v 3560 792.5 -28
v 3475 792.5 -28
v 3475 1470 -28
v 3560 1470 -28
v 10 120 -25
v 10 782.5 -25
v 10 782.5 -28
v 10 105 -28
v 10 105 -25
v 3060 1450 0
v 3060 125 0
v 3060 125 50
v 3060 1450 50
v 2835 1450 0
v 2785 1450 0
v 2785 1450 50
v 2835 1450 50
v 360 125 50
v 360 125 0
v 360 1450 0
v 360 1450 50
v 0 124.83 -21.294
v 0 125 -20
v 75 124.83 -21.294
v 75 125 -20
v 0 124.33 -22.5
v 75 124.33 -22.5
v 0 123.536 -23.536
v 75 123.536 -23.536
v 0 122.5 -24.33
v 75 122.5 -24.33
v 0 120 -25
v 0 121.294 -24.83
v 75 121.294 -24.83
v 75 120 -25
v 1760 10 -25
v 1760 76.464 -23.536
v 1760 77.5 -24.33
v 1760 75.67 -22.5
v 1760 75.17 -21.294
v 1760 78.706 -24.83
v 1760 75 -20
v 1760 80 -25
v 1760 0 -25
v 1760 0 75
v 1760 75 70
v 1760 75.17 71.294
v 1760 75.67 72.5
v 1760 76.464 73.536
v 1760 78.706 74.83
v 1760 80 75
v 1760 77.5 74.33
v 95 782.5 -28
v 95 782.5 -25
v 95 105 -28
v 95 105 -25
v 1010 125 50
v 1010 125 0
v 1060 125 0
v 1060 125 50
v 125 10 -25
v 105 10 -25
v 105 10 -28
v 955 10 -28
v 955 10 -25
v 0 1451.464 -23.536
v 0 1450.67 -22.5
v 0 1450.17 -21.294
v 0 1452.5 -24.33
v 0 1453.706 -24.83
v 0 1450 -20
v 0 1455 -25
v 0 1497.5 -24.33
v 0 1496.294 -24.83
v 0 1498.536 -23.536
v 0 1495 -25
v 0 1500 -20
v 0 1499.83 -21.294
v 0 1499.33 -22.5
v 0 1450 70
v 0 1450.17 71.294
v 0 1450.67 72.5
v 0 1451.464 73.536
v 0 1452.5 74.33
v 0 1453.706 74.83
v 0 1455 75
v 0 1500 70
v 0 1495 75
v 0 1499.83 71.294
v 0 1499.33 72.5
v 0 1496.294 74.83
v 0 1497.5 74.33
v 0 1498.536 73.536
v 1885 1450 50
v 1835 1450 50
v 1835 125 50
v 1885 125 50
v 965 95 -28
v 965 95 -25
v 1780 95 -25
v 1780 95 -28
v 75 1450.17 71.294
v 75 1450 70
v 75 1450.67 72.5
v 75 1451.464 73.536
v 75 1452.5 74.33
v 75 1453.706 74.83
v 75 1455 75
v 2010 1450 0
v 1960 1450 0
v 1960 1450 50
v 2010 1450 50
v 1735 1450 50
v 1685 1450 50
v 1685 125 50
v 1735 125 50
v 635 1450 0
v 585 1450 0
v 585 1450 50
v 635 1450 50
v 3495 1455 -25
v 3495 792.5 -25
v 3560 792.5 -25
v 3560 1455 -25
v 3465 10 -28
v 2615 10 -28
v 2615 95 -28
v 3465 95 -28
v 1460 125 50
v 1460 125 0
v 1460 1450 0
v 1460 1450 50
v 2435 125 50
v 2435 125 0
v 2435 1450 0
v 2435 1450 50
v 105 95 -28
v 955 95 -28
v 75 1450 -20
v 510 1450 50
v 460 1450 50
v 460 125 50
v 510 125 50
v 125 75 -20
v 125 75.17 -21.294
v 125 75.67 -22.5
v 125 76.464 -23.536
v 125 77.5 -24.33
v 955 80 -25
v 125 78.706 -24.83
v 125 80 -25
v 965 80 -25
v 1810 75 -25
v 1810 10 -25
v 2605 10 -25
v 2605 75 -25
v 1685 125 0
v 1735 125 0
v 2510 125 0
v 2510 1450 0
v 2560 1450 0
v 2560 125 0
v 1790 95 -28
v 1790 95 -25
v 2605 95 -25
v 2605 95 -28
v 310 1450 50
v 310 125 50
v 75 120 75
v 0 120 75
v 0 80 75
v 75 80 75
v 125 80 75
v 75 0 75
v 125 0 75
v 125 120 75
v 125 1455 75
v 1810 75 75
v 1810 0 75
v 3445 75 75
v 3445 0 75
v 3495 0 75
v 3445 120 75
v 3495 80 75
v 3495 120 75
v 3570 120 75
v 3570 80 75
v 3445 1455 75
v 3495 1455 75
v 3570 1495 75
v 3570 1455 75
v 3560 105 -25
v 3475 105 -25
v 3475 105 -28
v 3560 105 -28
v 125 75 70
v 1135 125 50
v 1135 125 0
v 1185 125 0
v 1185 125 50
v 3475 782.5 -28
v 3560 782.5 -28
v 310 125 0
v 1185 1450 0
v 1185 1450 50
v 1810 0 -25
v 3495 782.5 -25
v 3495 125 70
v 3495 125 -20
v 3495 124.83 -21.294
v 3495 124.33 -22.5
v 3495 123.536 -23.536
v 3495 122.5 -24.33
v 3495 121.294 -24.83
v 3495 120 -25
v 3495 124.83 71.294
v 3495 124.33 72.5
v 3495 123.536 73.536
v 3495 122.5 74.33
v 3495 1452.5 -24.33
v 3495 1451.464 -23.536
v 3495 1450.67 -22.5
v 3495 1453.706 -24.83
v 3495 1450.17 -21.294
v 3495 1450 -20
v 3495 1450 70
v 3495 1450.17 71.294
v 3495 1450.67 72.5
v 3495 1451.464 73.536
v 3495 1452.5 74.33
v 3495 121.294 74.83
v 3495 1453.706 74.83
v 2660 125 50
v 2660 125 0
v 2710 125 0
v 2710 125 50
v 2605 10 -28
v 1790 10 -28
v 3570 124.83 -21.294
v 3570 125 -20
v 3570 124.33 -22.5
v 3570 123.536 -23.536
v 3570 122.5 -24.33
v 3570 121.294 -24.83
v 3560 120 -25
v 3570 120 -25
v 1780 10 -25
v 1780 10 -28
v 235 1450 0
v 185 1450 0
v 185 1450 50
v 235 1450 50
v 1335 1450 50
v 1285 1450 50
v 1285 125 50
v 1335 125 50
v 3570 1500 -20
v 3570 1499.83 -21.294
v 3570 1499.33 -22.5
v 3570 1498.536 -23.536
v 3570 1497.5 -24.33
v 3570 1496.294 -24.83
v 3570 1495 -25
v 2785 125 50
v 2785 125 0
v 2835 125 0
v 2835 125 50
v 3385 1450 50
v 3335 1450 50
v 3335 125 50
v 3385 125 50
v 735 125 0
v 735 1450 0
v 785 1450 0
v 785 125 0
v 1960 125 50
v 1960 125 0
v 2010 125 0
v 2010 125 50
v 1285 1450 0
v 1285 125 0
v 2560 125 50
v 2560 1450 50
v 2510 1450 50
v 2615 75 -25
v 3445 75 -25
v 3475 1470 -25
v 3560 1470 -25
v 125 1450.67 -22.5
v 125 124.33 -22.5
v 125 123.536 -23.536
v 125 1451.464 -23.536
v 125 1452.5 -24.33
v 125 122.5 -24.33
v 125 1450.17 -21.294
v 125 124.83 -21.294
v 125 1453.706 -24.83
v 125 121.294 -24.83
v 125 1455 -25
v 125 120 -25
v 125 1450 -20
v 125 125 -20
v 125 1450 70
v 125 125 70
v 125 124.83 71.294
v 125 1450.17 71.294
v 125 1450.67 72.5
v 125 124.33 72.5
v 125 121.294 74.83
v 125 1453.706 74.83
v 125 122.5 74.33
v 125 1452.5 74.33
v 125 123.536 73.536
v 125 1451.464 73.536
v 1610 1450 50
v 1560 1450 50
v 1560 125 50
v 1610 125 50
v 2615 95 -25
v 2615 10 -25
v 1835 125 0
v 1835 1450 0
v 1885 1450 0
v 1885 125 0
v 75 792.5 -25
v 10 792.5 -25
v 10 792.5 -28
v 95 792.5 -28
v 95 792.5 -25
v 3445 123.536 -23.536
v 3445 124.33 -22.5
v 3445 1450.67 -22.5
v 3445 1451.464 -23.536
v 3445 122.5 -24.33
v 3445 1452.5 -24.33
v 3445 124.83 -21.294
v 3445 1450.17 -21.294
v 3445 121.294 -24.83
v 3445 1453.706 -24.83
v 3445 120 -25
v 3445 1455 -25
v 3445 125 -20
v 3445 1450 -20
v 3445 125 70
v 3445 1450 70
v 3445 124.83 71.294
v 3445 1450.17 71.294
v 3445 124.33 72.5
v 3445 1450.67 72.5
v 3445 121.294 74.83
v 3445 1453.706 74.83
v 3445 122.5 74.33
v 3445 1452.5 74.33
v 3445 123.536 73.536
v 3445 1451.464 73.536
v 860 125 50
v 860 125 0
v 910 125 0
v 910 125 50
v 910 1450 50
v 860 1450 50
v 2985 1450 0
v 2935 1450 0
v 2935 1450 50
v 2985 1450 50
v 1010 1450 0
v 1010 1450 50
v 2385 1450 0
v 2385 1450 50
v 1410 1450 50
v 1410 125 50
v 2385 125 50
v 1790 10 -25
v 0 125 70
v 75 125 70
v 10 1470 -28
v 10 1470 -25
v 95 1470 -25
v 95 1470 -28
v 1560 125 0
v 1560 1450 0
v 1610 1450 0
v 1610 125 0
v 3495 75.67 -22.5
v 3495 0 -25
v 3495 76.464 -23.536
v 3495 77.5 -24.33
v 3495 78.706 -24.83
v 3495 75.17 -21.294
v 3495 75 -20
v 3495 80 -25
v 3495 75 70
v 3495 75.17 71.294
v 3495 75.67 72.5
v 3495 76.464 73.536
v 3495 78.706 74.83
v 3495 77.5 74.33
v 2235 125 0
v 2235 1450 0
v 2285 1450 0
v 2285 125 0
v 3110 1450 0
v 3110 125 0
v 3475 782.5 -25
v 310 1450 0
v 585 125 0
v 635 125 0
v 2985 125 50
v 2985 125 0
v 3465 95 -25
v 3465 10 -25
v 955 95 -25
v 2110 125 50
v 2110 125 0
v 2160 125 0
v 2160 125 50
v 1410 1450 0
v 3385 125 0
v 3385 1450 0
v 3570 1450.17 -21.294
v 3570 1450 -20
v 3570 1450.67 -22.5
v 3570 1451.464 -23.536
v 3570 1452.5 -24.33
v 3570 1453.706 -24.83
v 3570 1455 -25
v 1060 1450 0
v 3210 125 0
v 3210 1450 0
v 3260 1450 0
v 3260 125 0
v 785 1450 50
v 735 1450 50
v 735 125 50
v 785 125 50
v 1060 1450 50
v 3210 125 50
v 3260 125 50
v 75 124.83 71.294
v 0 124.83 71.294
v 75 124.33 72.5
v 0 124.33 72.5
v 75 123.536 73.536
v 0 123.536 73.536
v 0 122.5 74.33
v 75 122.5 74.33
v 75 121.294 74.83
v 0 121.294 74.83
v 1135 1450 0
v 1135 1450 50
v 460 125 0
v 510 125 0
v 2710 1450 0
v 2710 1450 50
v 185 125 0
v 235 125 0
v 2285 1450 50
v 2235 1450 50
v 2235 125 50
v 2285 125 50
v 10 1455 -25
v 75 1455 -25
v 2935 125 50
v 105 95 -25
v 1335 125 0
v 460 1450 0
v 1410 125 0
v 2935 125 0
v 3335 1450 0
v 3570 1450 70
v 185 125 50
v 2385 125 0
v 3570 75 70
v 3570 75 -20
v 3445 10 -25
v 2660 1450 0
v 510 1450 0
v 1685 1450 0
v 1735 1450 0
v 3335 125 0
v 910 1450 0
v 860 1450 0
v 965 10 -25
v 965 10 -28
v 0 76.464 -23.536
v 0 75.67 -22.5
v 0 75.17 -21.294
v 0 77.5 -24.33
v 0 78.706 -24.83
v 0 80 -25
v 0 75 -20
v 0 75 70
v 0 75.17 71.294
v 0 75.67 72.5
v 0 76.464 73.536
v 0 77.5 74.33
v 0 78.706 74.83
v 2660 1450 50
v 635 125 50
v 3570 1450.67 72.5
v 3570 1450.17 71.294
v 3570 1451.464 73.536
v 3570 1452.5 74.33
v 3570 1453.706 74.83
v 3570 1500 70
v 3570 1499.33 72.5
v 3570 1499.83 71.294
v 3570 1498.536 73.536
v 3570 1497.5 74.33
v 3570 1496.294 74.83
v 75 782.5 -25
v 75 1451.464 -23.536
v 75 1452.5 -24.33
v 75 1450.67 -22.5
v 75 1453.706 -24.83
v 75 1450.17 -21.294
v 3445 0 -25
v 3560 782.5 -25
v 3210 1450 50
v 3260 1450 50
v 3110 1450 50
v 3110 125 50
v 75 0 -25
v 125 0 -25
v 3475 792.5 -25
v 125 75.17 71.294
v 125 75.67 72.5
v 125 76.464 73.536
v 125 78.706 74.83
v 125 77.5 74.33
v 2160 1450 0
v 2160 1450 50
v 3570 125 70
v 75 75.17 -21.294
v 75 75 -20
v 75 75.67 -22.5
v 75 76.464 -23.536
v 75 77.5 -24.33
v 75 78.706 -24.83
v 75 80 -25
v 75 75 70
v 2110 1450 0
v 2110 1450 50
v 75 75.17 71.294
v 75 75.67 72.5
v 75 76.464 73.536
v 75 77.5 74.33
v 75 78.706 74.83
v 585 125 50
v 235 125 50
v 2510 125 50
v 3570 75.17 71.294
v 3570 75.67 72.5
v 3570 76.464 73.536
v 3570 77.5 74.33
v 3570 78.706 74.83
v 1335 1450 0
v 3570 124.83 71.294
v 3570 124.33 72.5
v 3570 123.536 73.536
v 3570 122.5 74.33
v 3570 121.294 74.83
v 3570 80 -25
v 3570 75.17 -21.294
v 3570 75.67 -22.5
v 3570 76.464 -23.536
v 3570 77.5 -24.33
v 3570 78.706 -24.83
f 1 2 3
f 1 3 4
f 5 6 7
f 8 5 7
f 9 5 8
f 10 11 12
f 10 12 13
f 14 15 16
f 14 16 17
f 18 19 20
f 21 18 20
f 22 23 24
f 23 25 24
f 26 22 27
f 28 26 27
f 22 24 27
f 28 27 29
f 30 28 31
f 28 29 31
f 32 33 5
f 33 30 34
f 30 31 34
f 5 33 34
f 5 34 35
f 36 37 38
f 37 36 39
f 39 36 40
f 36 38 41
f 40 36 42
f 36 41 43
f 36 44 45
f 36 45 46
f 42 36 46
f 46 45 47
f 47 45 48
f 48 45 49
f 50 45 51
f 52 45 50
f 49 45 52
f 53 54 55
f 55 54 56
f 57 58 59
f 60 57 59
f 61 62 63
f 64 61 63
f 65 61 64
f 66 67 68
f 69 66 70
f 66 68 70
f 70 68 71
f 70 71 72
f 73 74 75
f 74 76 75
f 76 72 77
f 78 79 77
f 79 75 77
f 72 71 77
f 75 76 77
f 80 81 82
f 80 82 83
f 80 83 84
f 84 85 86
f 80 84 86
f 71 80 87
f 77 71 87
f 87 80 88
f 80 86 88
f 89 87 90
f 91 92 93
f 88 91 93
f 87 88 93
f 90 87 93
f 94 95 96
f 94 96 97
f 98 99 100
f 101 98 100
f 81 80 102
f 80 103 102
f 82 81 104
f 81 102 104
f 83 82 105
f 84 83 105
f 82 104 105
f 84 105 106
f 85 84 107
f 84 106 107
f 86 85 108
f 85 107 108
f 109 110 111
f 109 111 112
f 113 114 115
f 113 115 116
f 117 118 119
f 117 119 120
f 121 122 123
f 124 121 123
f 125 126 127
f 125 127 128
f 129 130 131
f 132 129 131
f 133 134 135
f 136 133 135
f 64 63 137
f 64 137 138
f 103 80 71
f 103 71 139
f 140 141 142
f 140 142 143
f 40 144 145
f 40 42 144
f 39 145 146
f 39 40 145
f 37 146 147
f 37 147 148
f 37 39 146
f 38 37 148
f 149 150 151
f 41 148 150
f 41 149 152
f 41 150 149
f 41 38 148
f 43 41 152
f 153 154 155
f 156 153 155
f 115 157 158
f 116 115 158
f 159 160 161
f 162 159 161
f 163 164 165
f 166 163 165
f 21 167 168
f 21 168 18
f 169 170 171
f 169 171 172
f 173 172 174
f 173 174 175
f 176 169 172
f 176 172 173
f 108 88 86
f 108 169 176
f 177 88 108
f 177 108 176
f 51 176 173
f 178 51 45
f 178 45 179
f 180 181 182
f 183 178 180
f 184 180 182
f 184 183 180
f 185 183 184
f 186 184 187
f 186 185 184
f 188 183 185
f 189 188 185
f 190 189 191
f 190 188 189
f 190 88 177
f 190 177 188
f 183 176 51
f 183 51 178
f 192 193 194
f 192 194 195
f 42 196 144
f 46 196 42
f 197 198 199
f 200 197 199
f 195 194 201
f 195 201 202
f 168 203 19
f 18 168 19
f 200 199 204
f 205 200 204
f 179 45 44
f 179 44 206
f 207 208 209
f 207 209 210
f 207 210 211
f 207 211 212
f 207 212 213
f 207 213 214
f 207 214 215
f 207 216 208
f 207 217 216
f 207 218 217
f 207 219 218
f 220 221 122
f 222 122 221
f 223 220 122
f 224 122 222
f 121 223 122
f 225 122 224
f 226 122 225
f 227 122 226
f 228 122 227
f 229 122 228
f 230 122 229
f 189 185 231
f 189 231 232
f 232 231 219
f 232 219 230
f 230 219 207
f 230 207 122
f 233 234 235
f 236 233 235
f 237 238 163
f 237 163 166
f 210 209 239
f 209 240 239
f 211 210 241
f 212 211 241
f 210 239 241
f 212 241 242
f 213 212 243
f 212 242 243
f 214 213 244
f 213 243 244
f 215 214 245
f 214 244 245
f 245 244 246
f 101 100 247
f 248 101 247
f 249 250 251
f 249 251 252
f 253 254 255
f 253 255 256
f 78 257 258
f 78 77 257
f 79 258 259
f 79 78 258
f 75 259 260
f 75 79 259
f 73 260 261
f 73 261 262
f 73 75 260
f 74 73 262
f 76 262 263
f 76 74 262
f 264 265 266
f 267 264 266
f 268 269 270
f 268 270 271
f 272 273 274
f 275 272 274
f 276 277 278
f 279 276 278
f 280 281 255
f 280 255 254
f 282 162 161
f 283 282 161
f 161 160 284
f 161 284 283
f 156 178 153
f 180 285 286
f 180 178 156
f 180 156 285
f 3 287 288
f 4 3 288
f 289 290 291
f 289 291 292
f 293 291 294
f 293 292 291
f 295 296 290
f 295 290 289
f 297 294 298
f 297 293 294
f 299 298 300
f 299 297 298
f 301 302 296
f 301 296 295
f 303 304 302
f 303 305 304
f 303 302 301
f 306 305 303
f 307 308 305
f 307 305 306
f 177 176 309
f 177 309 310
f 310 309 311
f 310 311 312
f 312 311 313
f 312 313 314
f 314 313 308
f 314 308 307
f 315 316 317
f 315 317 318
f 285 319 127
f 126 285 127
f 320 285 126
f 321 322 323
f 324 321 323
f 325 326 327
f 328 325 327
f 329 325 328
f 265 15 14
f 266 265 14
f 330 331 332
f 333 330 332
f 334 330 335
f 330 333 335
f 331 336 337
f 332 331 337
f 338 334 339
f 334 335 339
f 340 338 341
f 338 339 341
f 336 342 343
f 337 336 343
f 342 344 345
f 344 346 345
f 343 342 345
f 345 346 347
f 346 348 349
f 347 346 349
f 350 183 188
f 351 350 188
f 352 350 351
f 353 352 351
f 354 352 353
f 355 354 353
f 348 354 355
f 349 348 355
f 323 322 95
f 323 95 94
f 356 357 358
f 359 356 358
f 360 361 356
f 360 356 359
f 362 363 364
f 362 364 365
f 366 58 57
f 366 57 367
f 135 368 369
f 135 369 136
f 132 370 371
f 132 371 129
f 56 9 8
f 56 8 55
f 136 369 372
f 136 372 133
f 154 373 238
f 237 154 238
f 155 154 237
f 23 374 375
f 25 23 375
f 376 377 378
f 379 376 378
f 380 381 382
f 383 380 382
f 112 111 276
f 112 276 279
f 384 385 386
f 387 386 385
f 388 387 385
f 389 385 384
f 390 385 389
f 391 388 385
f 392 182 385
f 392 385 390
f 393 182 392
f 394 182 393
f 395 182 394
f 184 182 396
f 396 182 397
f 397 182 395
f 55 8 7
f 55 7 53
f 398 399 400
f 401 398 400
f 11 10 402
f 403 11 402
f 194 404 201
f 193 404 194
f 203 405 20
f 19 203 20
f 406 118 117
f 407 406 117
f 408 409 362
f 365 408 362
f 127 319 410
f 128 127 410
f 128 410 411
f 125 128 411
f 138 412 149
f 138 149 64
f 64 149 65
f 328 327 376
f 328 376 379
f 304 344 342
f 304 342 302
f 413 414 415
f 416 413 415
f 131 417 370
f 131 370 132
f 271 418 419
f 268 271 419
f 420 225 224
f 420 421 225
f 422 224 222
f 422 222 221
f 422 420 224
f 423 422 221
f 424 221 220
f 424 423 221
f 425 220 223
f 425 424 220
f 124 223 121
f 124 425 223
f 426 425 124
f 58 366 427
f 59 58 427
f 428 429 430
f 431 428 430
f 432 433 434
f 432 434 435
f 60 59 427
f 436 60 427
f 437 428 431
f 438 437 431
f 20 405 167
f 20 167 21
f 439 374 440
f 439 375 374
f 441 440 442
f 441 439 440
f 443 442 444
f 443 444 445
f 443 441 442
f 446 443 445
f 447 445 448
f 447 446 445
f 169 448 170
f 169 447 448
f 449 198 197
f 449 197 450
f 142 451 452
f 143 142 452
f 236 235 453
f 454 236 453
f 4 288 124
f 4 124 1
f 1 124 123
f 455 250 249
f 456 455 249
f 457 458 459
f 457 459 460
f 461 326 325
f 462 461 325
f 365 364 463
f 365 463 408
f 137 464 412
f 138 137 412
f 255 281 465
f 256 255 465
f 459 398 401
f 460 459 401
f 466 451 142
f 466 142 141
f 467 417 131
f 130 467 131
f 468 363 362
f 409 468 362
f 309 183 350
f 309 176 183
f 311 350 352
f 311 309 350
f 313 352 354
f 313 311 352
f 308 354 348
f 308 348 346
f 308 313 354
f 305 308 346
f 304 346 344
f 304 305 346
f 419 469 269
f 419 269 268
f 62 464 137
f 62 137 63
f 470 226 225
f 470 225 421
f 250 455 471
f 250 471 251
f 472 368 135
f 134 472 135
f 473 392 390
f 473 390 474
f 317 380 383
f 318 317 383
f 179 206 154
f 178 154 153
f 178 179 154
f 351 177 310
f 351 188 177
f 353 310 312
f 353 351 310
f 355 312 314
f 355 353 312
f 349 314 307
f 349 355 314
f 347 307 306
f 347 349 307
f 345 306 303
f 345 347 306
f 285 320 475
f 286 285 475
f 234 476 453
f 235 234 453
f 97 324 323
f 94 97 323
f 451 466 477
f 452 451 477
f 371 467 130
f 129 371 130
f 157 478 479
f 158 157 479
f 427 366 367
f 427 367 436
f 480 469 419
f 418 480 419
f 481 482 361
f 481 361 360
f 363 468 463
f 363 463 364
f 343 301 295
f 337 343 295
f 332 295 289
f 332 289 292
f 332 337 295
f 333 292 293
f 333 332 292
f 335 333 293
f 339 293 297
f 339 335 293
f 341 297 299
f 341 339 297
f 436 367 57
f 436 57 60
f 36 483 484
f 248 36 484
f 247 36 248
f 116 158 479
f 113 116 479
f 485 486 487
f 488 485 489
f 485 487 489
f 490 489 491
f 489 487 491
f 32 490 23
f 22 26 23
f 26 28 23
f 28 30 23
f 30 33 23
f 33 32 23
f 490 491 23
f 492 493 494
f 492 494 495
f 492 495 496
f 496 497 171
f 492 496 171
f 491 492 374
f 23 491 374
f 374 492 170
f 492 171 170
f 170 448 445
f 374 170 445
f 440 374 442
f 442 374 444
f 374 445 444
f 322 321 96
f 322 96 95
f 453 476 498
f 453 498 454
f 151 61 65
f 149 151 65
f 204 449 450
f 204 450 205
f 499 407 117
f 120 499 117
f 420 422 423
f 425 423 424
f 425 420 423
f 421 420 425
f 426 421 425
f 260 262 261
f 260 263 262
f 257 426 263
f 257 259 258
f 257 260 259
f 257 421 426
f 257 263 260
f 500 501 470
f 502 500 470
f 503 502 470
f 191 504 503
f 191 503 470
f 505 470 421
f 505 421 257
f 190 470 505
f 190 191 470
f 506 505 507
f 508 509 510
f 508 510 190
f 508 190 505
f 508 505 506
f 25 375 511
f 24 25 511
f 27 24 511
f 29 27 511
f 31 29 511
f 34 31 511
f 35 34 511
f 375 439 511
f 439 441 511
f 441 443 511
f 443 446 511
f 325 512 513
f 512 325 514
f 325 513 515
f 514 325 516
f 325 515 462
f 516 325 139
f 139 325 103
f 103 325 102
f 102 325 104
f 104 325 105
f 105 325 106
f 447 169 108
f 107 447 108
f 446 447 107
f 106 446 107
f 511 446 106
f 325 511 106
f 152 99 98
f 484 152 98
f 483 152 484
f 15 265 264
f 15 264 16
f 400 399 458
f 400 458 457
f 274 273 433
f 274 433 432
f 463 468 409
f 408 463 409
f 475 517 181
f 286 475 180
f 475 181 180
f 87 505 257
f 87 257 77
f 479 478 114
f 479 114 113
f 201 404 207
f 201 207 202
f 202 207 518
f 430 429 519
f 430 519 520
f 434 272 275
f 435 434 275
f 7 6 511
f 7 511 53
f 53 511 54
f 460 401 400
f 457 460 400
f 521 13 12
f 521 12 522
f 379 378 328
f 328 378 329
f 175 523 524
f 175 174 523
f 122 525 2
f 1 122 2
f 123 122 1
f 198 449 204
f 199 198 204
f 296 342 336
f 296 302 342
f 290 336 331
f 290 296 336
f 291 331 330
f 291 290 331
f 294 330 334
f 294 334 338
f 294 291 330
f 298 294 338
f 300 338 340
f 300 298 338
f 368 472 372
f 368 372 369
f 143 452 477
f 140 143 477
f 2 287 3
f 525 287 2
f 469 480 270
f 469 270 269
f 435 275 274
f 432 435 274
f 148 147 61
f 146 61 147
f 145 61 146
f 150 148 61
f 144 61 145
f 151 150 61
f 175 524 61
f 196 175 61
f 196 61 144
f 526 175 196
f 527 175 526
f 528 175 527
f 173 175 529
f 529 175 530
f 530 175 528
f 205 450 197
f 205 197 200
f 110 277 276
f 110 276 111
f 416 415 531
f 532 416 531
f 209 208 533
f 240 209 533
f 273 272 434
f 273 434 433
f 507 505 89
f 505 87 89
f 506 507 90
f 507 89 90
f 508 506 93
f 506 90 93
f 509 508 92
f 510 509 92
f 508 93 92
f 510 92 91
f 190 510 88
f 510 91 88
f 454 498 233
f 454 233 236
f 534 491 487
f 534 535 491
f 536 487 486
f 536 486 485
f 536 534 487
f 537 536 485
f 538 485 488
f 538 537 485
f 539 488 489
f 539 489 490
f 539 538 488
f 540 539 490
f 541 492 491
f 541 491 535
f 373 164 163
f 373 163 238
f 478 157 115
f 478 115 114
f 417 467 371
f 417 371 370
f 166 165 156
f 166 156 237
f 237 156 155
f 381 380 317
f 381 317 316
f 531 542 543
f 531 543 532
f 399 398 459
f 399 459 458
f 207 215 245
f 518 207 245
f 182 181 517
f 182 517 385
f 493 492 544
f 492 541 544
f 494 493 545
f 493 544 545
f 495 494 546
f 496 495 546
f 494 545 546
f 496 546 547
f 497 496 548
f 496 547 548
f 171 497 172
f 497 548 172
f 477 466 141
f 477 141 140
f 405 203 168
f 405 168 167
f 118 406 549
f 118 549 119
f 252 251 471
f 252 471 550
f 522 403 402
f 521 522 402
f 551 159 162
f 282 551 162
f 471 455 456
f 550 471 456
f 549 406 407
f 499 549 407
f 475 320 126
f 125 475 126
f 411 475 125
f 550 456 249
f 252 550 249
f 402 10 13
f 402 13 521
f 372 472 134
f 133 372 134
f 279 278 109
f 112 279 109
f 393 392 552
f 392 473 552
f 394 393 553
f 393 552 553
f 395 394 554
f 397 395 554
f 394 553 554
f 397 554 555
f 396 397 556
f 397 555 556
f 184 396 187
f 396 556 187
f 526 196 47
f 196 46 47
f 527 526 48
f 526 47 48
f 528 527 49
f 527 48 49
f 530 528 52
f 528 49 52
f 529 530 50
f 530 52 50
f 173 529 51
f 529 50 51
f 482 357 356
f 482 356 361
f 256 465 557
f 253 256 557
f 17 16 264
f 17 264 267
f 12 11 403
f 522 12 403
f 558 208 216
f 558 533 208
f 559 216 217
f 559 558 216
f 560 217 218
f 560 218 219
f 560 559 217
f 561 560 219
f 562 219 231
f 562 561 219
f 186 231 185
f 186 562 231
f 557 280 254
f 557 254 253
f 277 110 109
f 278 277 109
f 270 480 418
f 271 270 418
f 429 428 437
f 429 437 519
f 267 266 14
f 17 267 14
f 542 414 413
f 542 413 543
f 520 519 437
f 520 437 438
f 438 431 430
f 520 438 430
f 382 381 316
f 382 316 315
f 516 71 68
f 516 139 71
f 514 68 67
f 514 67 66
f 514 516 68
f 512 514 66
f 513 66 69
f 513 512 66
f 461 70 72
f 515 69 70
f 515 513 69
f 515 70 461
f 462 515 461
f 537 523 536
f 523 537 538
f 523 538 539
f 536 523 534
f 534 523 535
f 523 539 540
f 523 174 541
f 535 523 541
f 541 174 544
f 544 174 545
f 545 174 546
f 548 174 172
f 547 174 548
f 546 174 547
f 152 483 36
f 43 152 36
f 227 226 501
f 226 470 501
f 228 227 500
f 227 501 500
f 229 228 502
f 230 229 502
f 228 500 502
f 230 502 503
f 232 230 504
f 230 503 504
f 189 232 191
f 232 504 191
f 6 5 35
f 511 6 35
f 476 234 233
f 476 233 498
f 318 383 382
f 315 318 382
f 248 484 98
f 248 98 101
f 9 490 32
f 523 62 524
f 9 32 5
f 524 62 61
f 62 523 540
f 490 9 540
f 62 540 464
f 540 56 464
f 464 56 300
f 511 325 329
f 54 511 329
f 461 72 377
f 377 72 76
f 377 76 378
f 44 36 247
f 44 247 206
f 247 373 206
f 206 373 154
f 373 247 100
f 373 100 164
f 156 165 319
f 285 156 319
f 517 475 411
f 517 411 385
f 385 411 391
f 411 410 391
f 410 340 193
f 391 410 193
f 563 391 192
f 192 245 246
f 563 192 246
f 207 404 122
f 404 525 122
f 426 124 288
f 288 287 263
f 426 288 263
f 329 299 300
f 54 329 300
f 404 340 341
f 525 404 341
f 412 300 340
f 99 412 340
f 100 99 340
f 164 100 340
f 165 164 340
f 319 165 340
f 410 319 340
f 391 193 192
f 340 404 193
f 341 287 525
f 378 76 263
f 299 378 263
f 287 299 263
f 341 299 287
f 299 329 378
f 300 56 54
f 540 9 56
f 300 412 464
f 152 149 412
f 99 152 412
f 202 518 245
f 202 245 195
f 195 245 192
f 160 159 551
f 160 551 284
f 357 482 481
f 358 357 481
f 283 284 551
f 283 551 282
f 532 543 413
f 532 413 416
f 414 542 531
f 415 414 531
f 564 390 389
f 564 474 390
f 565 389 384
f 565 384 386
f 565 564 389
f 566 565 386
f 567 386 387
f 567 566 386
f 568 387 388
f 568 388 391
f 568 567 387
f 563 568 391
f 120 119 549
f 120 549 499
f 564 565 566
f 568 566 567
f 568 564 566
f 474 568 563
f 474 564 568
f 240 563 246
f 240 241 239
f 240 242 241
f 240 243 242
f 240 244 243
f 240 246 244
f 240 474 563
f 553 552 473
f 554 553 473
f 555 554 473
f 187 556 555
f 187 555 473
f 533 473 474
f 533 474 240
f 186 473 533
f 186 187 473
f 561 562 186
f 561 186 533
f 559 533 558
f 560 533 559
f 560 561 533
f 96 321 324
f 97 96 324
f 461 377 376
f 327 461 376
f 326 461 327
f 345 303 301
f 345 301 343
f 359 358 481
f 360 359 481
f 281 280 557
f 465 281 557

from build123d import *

# Parameters (mm, degrees)
F0_W          = 75
F0_H          = 50
F0_W_2        = 50
F0_W_3        = 3320
F0_H_2        = 1325
F0_H_3        = 75
F1_DEPTH      = 75
F1_DEPTH_BACK = 25
F2_R          = 5
F3_W          = 50
F3_H          = 1325
F4_DEPTH      = 50
F5_W          = 85
F5_H          = 677.5
F5_W_2        = 850
F5_H_2        = 85
F5_W_3        = 815
F6_DEPTH      = 3


with BuildPart() as f1:
    # F0 (on Top) → F1 (new body, two sides)
    with BuildSketch(Plane.XY) as f1_sk:
        with Locations((37.5, 1475)):
            Rectangle(F0_W, F0_H)
        with Locations((100, 1475)):
            Rectangle(F0_W_2, F0_H)
        with Locations((1785, 1475)):
            Rectangle(F0_W_3, F0_H)
        with Locations((100, 787.5)):
            Rectangle(F0_W_2, F0_H_2)
        with Locations((3470, 1475)):
            Rectangle(F0_W_2, F0_H)
        with Locations((37.5, 100)):
            Rectangle(F0_W, F0_H)
        with Locations((100, 100)):
            Rectangle(F0_W_2, F0_H)
        with Locations((3532.5, 1475)):
            Rectangle(F0_W, F0_H)
        with Locations((3470, 787.5)):
            Rectangle(F0_W_2, F0_H_2)
        Polygon((3445, 125), (125, 125), (125, 75), (1760, 75), (1810, 75), (3445, 75), align=None)
        with Locations((100, 37.5)):
            Rectangle(F0_W_2, F0_H_3)
        with Locations((3470, 100)):
            Rectangle(F0_W_2, F0_H)
        with Locations((3532.5, 100)):
            Rectangle(F0_W, F0_H)
        with Locations((3470, 37.5)):
            Rectangle(F0_W_2, F0_H_3)
        with Locations((1785, 37.5)):
            Rectangle(F0_W_2, F0_H_3)
    extrude(amount=F1_DEPTH)
    extrude(f1_sk.sketch, amount=-F1_DEPTH_BACK)

    # F2
    f2_edges = [f1.edges().sort_by_distance(p)[0] for p in [
        (1785, 1450, 75),
        (1785, 1500, 75),
        (1785, 125, 75),
        (942.5, 75, 75),
        (37.5, 75, 75),
        (37.5, 125, 75),
        (3532.5, 125, 75),
        (3532.5, 75, 75),
        (3532.5, 1450, 75),
        (37.5, 1450, 75),
        (1785, 1500, -25),
        (1785, 1450, -25),
        (3532.5, 1450, -25),
        (3532.5, 75, -25),
        (3532.5, 125, -25),
        (1785, 125, -25),
        (942.5, 75, -25),
        (37.5, 125, -25),
        (37.5, 75, -25),
        (37.5, 1450, -25),
    ]]
    fillet(f2_edges, radius=F2_R)

    # F5 (on face) → F6 (join)
    with BuildSketch(Plane(origin=(0, 0, -25), x_dir=(1, 0, 0), z_dir=(0, 0, -1))):
        with Locations((3517.5, -1131.25)):
            Rectangle(F5_W, F5_H)
        with Locations((3517.5, -443.75)):
            Rectangle(F5_W, F5_H)
        with Locations((52.5, -1131.25)):
            Rectangle(F5_W, F5_H)
        with Locations((52.5, -443.75)):
            Rectangle(F5_W, F5_H)
        with Locations((3040, -52.5)):
            Rectangle(F5_W_2, F5_H_2)
        with Locations((2197.5, -52.5)):
            Rectangle(F5_W_3, F5_H_2)
        with Locations((530, -52.5)):
            Rectangle(F5_W_2, F5_H_2)
        with Locations((1372.5, -52.5)):
            Rectangle(F5_W_3, F5_H_2)
    extrude(amount=F6_DEPTH)


with BuildPart() as f4:
    # F3 (on Top) → F4 (new body)
    with BuildSketch(Plane.XY):
        with Locations((210, 787.5)):
            Rectangle(F3_W, F3_H)
    extrude(amount=F4_DEPTH)


with BuildPart() as f4b:
    # F3 (on Top) → F4, piece 2 (new body)
    with BuildSketch(Plane.XY):
        with Locations((335, 787.5)):
            Rectangle(F3_W, F3_H)
    extrude(amount=F4_DEPTH)


with BuildPart() as f4c:
    # F3 (on Top) → F4, piece 3 (new body)
    with BuildSketch(Plane.XY):
        with Locations((610, 787.5)):
            Rectangle(F3_W, F3_H)
    extrude(amount=F4_DEPTH)


with BuildPart() as f4d:
    # F3 (on Top) → F4, piece 4 (new body)
    with BuildSketch(Plane.XY):
        with Locations((485, 787.5)):
            Rectangle(F3_W, F3_H)
    extrude(amount=F4_DEPTH)


with BuildPart() as f4e:
    # F3 (on Top) → F4, piece 5 (new body)
    with BuildSketch(Plane.XY):
        with Locations((885, 787.5)):
            Rectangle(F3_W, F3_H)
    extrude(amount=F4_DEPTH)


with BuildPart() as f4f:
    # F3 (on Top) → F4, piece 6 (new body)
    with BuildSketch(Plane.XY):
        with Locations((760, 787.5)):
            Rectangle(F3_W, F3_H)
    extrude(amount=F4_DEPTH)


with BuildPart() as f4g:
    # F3 (on Top) → F4, piece 7 (new body)
    with BuildSketch(Plane.XY):
        with Locations((1160, 787.5)):
            Rectangle(F3_W, F3_H)
    extrude(amount=F4_DEPTH)


with BuildPart() as f4h:
    # F3 (on Top) → F4, piece 8 (new body)
    with BuildSketch(Plane.XY):
        with Locations((1035, 787.5)):
            Rectangle(F3_W, F3_H)
    extrude(amount=F4_DEPTH)


with BuildPart() as f4i:
    # F3 (on Top) → F4, piece 9 (new body)
    with BuildSketch(Plane.XY):
        with Locations((1435, 787.5)):
            Rectangle(F3_W, F3_H)
    extrude(amount=F4_DEPTH)


with BuildPart() as f4j:
    # F3 (on Top) → F4, piece 10 (new body)
    with BuildSketch(Plane.XY):
        with Locations((1310, 787.5)):
            Rectangle(F3_W, F3_H)
    extrude(amount=F4_DEPTH)


with BuildPart() as f4k:
    # F3 (on Top) → F4, piece 11 (new body)
    with BuildSketch(Plane.XY):
        with Locations((1710, 787.5)):
            Rectangle(F3_W, F3_H)
    extrude(amount=F4_DEPTH)


with BuildPart() as f4l:
    # F3 (on Top) → F4, piece 12 (new body)
    with BuildSketch(Plane.XY):
        with Locations((1585, 787.5)):
            Rectangle(F3_W, F3_H)
    extrude(amount=F4_DEPTH)


with BuildPart() as f4m:
    # F3 (on Top) → F4, piece 13 (new body)
    with BuildSketch(Plane.XY):
        with Locations((1985, 787.5)):
            Rectangle(F3_W, F3_H)
    extrude(amount=F4_DEPTH)


with BuildPart() as f4n:
    # F3 (on Top) → F4, piece 14 (new body)
    with BuildSketch(Plane.XY):
        with Locations((1860, 787.5)):
            Rectangle(F3_W, F3_H)
    extrude(amount=F4_DEPTH)


with BuildPart() as f4o:
    # F3 (on Top) → F4, piece 15 (new body)
    with BuildSketch(Plane.XY):
        with Locations((2260, 787.5)):
            Rectangle(F3_W, F3_H)
    extrude(amount=F4_DEPTH)


with BuildPart() as f4p:
    # F3 (on Top) → F4, piece 16 (new body)
    with BuildSketch(Plane.XY):
        with Locations((2135, 787.5)):
            Rectangle(F3_W, F3_H)
    extrude(amount=F4_DEPTH)


with BuildPart() as f4q:
    # F3 (on Top) → F4, piece 17 (new body)
    with BuildSketch(Plane.XY):
        with Locations((2535, 787.5)):
            Rectangle(F3_W, F3_H)
    extrude(amount=F4_DEPTH)


with BuildPart() as f4r:
    # F3 (on Top) → F4, piece 18 (new body)
    with BuildSketch(Plane.XY):
        with Locations((2410, 787.5)):
            Rectangle(F3_W, F3_H)
    extrude(amount=F4_DEPTH)


with BuildPart() as f4s:
    # F3 (on Top) → F4, piece 19 (new body)
    with BuildSketch(Plane.XY):
        with Locations((2810, 787.5)):
            Rectangle(F3_W, F3_H)
    extrude(amount=F4_DEPTH)


with BuildPart() as f4t:
    # F3 (on Top) → F4, piece 20 (new body)
    with BuildSketch(Plane.XY):
        with Locations((2685, 787.5)):
            Rectangle(F3_W, F3_H)
    extrude(amount=F4_DEPTH)


with BuildPart() as f4u:
    # F3 (on Top) → F4, piece 21 (new body)
    with BuildSketch(Plane.XY):
        with Locations((3085, 787.5)):
            Rectangle(F3_W, F3_H)
    extrude(amount=F4_DEPTH)


with BuildPart() as f4v:
    # F3 (on Top) → F4, piece 22 (new body)
    with BuildSketch(Plane.XY):
        with Locations((2960, 787.5)):
            Rectangle(F3_W, F3_H)
    extrude(amount=F4_DEPTH)


with BuildPart() as f4w:
    # F3 (on Top) → F4, piece 23 (new body)
    with BuildSketch(Plane.XY):
        with Locations((3360, 787.5)):
            Rectangle(F3_W, F3_H)
    extrude(amount=F4_DEPTH)


with BuildPart() as f4x:
    # F3 (on Top) → F4, piece 24 (new body)
    with BuildSketch(Plane.XY):
        with Locations((3235, 787.5)):
            Rectangle(F3_W, F3_H)
    extrude(amount=F4_DEPTH)


solid = Compound([f1.part, f4.part, f4b.part, f4c.part, f4d.part, f4e.part, f4f.part, f4g.part, f4h.part, f4i.part, f4j.part, f4k.part, f4l.part, f4m.part, f4n.part, f4o.part, f4p.part, f4q.part, f4r.part, f4s.part, f4t.part, f4u.part, f4v.part, f4w.part, f4x.part])
